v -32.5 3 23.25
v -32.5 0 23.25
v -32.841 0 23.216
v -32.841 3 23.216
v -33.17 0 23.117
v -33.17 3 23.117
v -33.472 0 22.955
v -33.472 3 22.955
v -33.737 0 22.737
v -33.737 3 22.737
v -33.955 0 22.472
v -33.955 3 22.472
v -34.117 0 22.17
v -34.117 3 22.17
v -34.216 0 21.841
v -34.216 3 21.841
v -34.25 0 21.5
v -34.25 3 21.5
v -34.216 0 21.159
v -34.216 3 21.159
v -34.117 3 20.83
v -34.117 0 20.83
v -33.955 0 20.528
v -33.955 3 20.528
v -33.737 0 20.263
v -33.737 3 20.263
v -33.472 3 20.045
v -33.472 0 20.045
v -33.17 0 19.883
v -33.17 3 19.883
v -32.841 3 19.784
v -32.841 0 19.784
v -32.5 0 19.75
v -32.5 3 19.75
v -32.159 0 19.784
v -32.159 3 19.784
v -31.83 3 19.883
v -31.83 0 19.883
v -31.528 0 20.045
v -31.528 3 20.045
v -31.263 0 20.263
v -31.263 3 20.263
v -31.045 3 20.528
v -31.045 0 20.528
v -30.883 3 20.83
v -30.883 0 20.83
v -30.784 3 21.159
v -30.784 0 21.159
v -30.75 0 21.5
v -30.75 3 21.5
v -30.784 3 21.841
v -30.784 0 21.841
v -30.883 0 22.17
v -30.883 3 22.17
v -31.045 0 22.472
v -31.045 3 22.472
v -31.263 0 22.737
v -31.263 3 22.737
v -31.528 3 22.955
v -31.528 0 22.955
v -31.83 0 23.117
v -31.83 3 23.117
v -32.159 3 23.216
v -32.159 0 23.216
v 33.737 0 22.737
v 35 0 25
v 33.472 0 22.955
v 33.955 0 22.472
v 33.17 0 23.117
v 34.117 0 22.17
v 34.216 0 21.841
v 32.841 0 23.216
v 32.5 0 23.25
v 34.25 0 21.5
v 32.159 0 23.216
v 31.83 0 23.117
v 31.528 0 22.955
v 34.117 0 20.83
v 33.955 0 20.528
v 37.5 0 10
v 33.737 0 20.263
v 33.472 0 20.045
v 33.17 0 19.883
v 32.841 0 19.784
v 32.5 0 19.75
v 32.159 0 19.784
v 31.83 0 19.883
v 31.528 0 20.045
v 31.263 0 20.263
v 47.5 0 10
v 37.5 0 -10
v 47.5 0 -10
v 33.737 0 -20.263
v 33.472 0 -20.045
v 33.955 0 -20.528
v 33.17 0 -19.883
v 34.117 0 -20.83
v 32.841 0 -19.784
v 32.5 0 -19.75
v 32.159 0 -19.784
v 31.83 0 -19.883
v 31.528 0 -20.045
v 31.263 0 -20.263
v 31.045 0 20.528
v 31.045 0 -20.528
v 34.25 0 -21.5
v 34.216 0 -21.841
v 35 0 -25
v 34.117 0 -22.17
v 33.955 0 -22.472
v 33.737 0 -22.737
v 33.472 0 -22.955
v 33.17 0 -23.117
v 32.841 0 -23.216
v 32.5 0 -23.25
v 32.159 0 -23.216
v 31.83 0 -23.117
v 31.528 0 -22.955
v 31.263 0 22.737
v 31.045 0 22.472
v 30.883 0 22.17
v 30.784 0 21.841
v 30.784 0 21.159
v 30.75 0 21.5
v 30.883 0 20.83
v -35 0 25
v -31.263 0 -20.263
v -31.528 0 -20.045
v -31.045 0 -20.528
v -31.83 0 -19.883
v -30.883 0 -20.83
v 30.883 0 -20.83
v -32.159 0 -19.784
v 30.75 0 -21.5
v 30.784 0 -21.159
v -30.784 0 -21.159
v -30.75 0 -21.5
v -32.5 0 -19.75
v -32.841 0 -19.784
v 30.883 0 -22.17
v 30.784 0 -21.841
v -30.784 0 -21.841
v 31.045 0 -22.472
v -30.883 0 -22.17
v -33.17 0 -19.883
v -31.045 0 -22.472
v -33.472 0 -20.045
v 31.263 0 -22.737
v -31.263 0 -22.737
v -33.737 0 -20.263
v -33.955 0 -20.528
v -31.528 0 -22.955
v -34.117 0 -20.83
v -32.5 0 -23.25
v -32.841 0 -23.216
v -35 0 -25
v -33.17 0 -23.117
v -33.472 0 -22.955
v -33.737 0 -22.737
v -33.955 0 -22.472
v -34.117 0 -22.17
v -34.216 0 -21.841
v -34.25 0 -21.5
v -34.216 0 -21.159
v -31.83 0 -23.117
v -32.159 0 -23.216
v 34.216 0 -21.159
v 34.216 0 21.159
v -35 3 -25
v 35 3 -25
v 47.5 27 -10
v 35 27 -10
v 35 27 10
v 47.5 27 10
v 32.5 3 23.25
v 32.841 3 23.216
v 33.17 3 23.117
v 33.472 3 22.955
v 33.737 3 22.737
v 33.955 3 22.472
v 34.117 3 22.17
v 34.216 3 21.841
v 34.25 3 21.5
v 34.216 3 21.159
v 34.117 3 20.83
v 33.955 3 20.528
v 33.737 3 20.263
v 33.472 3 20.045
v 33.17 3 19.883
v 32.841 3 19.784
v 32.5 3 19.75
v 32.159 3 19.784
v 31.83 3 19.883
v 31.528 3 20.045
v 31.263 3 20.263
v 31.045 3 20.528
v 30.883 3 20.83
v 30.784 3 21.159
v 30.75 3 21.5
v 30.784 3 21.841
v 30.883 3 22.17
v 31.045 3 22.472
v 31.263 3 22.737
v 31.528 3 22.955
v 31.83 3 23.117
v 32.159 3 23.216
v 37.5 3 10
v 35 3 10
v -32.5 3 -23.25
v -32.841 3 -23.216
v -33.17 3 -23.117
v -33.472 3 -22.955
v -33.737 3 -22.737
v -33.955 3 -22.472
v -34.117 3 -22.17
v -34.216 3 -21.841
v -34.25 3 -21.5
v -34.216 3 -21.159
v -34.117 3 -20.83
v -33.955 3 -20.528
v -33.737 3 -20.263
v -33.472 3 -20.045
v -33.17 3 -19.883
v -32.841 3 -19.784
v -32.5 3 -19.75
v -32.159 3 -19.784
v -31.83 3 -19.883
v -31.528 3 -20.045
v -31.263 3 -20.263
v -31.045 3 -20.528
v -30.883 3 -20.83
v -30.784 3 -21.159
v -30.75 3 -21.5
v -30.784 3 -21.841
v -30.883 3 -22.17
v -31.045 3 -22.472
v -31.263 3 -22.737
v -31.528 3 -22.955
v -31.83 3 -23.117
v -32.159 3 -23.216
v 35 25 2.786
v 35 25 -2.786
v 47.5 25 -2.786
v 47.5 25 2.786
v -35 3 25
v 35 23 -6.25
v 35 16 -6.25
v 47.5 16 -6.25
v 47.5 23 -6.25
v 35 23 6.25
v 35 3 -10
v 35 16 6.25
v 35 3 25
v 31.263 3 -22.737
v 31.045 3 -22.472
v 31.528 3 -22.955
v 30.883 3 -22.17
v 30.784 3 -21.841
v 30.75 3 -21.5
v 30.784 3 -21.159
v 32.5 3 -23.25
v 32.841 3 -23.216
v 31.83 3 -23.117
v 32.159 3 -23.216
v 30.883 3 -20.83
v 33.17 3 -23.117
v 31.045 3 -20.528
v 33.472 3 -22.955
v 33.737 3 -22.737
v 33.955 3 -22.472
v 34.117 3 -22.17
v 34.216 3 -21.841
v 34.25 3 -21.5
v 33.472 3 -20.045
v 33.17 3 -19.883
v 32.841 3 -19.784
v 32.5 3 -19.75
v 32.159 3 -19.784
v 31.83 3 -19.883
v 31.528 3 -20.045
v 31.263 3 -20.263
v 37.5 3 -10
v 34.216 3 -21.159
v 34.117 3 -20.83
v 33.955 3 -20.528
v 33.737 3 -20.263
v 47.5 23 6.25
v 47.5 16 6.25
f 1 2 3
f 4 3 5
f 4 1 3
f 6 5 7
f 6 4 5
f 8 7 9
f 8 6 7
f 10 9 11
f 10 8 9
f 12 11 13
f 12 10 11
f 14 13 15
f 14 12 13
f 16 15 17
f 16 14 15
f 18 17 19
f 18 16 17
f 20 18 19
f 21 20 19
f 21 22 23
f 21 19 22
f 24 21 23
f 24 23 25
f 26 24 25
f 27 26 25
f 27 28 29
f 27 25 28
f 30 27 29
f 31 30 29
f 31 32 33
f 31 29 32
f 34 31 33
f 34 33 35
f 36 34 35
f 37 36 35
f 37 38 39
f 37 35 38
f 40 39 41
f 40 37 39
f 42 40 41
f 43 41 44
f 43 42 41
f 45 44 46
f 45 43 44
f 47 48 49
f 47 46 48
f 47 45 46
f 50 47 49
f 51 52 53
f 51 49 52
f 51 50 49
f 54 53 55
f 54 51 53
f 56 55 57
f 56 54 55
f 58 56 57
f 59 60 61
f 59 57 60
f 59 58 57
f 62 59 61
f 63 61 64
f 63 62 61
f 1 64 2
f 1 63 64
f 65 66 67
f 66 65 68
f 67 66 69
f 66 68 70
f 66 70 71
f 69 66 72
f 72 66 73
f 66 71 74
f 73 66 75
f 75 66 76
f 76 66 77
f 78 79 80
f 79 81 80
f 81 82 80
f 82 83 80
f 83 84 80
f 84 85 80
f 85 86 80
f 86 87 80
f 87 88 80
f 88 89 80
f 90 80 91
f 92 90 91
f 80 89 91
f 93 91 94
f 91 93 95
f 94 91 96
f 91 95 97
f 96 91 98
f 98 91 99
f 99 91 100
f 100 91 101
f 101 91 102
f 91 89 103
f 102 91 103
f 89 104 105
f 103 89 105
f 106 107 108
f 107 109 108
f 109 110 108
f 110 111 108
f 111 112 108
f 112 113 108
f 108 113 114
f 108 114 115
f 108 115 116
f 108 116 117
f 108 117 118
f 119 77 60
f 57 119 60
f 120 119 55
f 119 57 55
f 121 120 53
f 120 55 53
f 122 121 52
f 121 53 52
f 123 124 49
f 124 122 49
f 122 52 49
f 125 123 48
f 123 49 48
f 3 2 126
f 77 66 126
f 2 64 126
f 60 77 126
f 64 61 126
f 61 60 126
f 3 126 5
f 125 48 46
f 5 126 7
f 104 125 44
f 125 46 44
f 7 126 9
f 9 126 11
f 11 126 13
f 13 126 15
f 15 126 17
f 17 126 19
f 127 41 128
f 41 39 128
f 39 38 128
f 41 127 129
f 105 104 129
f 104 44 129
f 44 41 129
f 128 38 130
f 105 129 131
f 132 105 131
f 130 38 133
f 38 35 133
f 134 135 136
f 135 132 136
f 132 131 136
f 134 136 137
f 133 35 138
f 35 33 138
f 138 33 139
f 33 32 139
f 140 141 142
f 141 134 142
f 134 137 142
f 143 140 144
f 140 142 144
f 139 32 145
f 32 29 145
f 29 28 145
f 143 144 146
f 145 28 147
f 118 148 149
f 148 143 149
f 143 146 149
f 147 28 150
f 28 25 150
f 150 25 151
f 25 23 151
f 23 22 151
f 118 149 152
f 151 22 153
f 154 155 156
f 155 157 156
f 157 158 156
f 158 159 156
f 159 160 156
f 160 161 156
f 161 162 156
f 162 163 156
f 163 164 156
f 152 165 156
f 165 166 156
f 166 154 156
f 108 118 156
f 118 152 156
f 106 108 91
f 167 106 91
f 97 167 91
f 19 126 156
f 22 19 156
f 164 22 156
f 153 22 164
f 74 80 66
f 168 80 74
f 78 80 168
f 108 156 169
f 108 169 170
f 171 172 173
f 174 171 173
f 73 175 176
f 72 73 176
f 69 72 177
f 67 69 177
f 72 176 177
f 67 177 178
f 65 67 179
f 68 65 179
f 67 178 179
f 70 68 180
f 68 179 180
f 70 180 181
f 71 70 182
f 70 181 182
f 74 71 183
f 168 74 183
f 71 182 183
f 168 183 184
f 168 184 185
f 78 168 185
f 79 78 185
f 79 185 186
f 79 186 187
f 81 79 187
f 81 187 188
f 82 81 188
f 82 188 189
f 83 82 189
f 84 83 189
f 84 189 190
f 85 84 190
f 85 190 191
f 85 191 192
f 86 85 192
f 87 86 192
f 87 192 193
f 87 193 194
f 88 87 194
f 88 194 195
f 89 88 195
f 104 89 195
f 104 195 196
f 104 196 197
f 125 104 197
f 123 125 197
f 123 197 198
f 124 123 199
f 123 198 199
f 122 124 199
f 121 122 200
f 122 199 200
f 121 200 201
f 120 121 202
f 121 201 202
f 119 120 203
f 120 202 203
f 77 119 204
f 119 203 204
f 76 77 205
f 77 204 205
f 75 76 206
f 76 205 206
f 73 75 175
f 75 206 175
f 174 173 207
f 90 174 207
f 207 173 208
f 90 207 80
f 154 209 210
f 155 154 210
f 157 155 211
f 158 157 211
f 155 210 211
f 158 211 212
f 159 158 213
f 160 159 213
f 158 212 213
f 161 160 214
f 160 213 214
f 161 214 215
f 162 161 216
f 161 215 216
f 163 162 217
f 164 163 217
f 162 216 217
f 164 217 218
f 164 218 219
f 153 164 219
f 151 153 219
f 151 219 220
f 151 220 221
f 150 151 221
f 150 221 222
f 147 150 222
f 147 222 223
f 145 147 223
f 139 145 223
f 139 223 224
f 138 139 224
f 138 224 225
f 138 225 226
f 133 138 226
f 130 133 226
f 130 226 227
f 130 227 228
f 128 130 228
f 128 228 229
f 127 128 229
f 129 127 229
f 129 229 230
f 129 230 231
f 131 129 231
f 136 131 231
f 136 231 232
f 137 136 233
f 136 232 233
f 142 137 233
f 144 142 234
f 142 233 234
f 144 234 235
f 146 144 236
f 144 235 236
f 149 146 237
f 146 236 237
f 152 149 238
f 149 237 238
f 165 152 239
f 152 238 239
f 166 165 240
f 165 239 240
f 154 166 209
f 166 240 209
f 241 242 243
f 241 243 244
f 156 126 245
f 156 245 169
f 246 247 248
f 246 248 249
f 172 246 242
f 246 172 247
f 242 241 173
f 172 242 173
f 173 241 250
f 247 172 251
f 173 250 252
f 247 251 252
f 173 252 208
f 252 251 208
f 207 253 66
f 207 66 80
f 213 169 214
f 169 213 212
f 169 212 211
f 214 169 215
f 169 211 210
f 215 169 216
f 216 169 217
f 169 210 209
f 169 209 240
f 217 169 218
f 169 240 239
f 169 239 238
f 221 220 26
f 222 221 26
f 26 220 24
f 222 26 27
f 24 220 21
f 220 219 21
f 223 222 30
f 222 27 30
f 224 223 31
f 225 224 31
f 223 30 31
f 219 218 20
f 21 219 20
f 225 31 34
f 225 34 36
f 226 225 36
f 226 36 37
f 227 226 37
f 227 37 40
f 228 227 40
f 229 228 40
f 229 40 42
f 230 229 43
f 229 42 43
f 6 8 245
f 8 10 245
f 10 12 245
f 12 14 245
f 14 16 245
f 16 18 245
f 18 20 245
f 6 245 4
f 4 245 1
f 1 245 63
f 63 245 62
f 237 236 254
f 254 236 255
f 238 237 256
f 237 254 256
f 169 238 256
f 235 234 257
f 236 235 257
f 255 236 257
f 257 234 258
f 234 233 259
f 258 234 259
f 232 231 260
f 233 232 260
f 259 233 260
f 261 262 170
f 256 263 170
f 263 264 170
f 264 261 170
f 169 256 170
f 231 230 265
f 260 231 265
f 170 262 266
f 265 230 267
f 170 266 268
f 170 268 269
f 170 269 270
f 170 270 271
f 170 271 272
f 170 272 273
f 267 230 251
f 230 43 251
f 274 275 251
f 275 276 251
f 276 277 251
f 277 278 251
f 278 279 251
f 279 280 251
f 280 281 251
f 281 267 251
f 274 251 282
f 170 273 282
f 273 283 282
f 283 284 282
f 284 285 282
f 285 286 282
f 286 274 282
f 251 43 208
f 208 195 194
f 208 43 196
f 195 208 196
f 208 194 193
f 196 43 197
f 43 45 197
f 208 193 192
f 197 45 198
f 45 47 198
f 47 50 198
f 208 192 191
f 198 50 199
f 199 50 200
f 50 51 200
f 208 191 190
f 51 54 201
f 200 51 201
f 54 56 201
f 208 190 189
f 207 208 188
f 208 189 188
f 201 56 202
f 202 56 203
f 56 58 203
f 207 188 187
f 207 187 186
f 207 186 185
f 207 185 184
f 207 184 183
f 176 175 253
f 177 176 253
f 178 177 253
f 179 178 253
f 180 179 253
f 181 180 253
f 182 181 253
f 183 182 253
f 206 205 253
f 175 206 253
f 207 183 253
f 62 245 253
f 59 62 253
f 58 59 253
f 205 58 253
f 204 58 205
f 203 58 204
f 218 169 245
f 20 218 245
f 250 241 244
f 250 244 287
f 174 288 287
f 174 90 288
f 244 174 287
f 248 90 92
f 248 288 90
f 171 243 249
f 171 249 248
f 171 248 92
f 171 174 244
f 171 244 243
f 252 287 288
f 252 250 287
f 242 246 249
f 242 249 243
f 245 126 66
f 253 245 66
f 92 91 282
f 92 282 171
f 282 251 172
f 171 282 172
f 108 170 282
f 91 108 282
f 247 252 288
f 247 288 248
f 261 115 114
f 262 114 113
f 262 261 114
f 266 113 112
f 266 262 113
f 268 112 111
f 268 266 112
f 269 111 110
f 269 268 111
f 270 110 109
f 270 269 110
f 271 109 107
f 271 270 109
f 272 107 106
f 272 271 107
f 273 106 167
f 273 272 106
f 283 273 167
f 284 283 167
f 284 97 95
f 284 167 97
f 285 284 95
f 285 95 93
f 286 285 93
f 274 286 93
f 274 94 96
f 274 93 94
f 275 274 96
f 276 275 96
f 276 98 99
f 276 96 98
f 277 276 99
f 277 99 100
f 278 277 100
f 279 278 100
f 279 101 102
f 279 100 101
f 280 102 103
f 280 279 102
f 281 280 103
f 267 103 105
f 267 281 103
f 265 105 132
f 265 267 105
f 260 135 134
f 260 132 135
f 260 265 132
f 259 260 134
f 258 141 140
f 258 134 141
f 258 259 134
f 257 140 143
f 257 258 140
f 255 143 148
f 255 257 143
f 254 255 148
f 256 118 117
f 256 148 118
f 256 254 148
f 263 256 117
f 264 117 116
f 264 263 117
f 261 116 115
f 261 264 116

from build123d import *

# Parameters (mm, degrees)
SKETCH1_W                                  = 70
SKETCH1_H                                  = 50
BOSS_EXTRUDE1_DEPTH                        = 3
SKETCH2_R                                  = 1.75
CUT_EXTRUDE1_DEPTH                         = 10
MIRROR1_AT_THE_SECOND_PLANE_COPY_1_SKETC_R = 1.75
MIRROR1_AT_THE_SECOND_PLANE_COPY_1_DEPTH   = 10
SKETCH4_W                                  = 2.5
SKETCH4_H                                  = 10
BOSS_EXTRUDE2_DEPTH                        = 28
BOSS_EXTRUDE3_DEPTH                        = 3
CUT_EXTRUDE2_DEPTH                         = 3
BOSS_EXTRUDE4_DEPTH                        = 10
BOSS_EXTRUDE5_DEPTH                        = 10
SKETCH11_W                                 = 20
SKETCH11_H                                 = 1
CUT_EXTRUDE3_DEPTH                         = 10


with BuildPart() as part:
    # Sketch1 → Boss-Extrude1 (new body)
    with BuildSketch(Plane(origin=(0, 0, 0), x_dir=(1, 0, 0), z_dir=(0, 1, 0))):
        Rectangle(SKETCH1_W, SKETCH1_H)
    extrude(amount=BOSS_EXTRUDE1_DEPTH)

    # Sketch2 → Cut-Extrude1 (cut)
    with BuildSketch(Plane(origin=(0, 3, 0), x_dir=(1, 0, 0), z_dir=(0, 1, 0))):
        with Locations(Location((32.5, -21.5, 0), (0, 0, 270))):
            Circle(SKETCH2_R)
    cut_extrude1 = extrude(amount=-CUT_EXTRUDE1_DEPTH, mode=Mode.SUBTRACT)

    # Mirror1: Cut-Extrude1 across plane
    add(cut_extrude1.mirror(Plane.XY), mode=Mode.SUBTRACT)

    # Mirror1 at the second plane: Cut-Extrude1 across plane
    add(cut_extrude1.mirror(Plane(origin=(0, 0, 0), x_dir=(0, 0, 1), z_dir=(1, 0, 0))), mode=Mode.SUBTRACT)

    # Mirror1 at the second plane copy 1 sketc → Mirror1 at the second plane copy 1 (cut)
    with BuildSketch(Plane(origin=(0, 3, 0), x_dir=(-1, 0, 0), z_dir=(0, 1, 0))):
        with Locations(Location((32.5, -21.5, 0), (0, 0, 270))):
            Circle(MIRROR1_AT_THE_SECOND_PLANE_COPY_1_SKETC_R)
    extrude(amount=-MIRROR1_AT_THE_SECOND_PLANE_COPY_1_DEPTH, mode=Mode.SUBTRACT)

    # Sketch4 → Boss-Extrude2 (add)
    with BuildSketch(Plane(origin=(0, 0, 0), x_dir=(1, 0, 0), z_dir=(0, 1, 0))):
        with Locations((36.25, -5)):
            Rectangle(SKETCH4_W, SKETCH4_H)
        with Locations((36.25, 5)):
            Rectangle(SKETCH4_W, SKETCH4_H)
    extrude(amount=BOSS_EXTRUDE2_DEPTH)

    # Sketch7 → Boss-Extrude3 (add)
    with BuildSketch(Plane(origin=(0, 3, 0), x_dir=(1, 0, 0), z_dir=(0, 1, 0))):
        Polygon((35, -10), (35, -25), (37.5, -10), align=None)
    boss_extrude3 = extrude(amount=-BOSS_EXTRUDE3_DEPTH)

    # Mirror2: Boss-Extrude3 across plane
    add(boss_extrude3.mirror(Plane.XY))

    # Sketch8 → Cut-Extrude2 (cut)
    with BuildSketch(Plane(origin=(37.5, 0, 0), x_dir=(0, 0, -1), z_dir=(1, 0, 0))):
        Polygon((-2.785898385, 25), (-6.25, 23), (-6.25, 16), (6.25, 16), (6.25, 23), (2.785898385, 25), align=None)
    extrude(amount=-CUT_EXTRUDE2_DEPTH, mode=Mode.SUBTRACT)

    # Sketch9 → Boss-Extrude4 (add)
    with BuildSketch(Plane(origin=(37.5, 0, 0), x_dir=(0, 0, -1), z_dir=(1, 0, 0))):
        Polygon((-6.75, 15.5), (6.75, 15.5), (6.75, 23.288675135), (2.919872981, 25.5), (-2.919872981, 25.5), (-6.75, 23.288675135), align=None)
        Polygon((-6.25, 23), (-6.25, 16), (6.25, 16), (6.25, 23), (2.785898385, 25), (-2.785898385, 25), align=None, mode=Mode.SUBTRACT)
    extrude(amount=BOSS_EXTRUDE4_DEPTH)

    # Sketch10 → Boss-Extrude5 (add)
    with BuildSketch(Plane(origin=(37.5, 0, 0), x_dir=(0, 0, -1), z_dir=(1, 0, 0))):
        Polygon((10, 27), (-10, 27), (-10, 3), (-10, 0), (10, 0), (10, 3), align=None)
        Polygon((-6.75, 15.5), (-6.75, 23.288675135), (-2.919872981, 25.5), (2.919872981, 25.5), (6.75, 23.288675135), (6.75, 15.5), align=None, mode=Mode.SUBTRACT)
    extrude(amount=BOSS_EXTRUDE5_DEPTH)

    # Sketch11 → Cut-Extrude3 (cut)
    with BuildSketch(Plane(origin=(37.5, 0, 0), x_dir=(0, 0, -1), z_dir=(1, 0, 0))):
        with Locations((0, 27.5)):
            Rectangle(SKETCH11_W, SKETCH11_H)
    extrude(amount=-CUT_EXTRUDE3_DEPTH, mode=Mode.SUBTRACT)


solid = part.part
